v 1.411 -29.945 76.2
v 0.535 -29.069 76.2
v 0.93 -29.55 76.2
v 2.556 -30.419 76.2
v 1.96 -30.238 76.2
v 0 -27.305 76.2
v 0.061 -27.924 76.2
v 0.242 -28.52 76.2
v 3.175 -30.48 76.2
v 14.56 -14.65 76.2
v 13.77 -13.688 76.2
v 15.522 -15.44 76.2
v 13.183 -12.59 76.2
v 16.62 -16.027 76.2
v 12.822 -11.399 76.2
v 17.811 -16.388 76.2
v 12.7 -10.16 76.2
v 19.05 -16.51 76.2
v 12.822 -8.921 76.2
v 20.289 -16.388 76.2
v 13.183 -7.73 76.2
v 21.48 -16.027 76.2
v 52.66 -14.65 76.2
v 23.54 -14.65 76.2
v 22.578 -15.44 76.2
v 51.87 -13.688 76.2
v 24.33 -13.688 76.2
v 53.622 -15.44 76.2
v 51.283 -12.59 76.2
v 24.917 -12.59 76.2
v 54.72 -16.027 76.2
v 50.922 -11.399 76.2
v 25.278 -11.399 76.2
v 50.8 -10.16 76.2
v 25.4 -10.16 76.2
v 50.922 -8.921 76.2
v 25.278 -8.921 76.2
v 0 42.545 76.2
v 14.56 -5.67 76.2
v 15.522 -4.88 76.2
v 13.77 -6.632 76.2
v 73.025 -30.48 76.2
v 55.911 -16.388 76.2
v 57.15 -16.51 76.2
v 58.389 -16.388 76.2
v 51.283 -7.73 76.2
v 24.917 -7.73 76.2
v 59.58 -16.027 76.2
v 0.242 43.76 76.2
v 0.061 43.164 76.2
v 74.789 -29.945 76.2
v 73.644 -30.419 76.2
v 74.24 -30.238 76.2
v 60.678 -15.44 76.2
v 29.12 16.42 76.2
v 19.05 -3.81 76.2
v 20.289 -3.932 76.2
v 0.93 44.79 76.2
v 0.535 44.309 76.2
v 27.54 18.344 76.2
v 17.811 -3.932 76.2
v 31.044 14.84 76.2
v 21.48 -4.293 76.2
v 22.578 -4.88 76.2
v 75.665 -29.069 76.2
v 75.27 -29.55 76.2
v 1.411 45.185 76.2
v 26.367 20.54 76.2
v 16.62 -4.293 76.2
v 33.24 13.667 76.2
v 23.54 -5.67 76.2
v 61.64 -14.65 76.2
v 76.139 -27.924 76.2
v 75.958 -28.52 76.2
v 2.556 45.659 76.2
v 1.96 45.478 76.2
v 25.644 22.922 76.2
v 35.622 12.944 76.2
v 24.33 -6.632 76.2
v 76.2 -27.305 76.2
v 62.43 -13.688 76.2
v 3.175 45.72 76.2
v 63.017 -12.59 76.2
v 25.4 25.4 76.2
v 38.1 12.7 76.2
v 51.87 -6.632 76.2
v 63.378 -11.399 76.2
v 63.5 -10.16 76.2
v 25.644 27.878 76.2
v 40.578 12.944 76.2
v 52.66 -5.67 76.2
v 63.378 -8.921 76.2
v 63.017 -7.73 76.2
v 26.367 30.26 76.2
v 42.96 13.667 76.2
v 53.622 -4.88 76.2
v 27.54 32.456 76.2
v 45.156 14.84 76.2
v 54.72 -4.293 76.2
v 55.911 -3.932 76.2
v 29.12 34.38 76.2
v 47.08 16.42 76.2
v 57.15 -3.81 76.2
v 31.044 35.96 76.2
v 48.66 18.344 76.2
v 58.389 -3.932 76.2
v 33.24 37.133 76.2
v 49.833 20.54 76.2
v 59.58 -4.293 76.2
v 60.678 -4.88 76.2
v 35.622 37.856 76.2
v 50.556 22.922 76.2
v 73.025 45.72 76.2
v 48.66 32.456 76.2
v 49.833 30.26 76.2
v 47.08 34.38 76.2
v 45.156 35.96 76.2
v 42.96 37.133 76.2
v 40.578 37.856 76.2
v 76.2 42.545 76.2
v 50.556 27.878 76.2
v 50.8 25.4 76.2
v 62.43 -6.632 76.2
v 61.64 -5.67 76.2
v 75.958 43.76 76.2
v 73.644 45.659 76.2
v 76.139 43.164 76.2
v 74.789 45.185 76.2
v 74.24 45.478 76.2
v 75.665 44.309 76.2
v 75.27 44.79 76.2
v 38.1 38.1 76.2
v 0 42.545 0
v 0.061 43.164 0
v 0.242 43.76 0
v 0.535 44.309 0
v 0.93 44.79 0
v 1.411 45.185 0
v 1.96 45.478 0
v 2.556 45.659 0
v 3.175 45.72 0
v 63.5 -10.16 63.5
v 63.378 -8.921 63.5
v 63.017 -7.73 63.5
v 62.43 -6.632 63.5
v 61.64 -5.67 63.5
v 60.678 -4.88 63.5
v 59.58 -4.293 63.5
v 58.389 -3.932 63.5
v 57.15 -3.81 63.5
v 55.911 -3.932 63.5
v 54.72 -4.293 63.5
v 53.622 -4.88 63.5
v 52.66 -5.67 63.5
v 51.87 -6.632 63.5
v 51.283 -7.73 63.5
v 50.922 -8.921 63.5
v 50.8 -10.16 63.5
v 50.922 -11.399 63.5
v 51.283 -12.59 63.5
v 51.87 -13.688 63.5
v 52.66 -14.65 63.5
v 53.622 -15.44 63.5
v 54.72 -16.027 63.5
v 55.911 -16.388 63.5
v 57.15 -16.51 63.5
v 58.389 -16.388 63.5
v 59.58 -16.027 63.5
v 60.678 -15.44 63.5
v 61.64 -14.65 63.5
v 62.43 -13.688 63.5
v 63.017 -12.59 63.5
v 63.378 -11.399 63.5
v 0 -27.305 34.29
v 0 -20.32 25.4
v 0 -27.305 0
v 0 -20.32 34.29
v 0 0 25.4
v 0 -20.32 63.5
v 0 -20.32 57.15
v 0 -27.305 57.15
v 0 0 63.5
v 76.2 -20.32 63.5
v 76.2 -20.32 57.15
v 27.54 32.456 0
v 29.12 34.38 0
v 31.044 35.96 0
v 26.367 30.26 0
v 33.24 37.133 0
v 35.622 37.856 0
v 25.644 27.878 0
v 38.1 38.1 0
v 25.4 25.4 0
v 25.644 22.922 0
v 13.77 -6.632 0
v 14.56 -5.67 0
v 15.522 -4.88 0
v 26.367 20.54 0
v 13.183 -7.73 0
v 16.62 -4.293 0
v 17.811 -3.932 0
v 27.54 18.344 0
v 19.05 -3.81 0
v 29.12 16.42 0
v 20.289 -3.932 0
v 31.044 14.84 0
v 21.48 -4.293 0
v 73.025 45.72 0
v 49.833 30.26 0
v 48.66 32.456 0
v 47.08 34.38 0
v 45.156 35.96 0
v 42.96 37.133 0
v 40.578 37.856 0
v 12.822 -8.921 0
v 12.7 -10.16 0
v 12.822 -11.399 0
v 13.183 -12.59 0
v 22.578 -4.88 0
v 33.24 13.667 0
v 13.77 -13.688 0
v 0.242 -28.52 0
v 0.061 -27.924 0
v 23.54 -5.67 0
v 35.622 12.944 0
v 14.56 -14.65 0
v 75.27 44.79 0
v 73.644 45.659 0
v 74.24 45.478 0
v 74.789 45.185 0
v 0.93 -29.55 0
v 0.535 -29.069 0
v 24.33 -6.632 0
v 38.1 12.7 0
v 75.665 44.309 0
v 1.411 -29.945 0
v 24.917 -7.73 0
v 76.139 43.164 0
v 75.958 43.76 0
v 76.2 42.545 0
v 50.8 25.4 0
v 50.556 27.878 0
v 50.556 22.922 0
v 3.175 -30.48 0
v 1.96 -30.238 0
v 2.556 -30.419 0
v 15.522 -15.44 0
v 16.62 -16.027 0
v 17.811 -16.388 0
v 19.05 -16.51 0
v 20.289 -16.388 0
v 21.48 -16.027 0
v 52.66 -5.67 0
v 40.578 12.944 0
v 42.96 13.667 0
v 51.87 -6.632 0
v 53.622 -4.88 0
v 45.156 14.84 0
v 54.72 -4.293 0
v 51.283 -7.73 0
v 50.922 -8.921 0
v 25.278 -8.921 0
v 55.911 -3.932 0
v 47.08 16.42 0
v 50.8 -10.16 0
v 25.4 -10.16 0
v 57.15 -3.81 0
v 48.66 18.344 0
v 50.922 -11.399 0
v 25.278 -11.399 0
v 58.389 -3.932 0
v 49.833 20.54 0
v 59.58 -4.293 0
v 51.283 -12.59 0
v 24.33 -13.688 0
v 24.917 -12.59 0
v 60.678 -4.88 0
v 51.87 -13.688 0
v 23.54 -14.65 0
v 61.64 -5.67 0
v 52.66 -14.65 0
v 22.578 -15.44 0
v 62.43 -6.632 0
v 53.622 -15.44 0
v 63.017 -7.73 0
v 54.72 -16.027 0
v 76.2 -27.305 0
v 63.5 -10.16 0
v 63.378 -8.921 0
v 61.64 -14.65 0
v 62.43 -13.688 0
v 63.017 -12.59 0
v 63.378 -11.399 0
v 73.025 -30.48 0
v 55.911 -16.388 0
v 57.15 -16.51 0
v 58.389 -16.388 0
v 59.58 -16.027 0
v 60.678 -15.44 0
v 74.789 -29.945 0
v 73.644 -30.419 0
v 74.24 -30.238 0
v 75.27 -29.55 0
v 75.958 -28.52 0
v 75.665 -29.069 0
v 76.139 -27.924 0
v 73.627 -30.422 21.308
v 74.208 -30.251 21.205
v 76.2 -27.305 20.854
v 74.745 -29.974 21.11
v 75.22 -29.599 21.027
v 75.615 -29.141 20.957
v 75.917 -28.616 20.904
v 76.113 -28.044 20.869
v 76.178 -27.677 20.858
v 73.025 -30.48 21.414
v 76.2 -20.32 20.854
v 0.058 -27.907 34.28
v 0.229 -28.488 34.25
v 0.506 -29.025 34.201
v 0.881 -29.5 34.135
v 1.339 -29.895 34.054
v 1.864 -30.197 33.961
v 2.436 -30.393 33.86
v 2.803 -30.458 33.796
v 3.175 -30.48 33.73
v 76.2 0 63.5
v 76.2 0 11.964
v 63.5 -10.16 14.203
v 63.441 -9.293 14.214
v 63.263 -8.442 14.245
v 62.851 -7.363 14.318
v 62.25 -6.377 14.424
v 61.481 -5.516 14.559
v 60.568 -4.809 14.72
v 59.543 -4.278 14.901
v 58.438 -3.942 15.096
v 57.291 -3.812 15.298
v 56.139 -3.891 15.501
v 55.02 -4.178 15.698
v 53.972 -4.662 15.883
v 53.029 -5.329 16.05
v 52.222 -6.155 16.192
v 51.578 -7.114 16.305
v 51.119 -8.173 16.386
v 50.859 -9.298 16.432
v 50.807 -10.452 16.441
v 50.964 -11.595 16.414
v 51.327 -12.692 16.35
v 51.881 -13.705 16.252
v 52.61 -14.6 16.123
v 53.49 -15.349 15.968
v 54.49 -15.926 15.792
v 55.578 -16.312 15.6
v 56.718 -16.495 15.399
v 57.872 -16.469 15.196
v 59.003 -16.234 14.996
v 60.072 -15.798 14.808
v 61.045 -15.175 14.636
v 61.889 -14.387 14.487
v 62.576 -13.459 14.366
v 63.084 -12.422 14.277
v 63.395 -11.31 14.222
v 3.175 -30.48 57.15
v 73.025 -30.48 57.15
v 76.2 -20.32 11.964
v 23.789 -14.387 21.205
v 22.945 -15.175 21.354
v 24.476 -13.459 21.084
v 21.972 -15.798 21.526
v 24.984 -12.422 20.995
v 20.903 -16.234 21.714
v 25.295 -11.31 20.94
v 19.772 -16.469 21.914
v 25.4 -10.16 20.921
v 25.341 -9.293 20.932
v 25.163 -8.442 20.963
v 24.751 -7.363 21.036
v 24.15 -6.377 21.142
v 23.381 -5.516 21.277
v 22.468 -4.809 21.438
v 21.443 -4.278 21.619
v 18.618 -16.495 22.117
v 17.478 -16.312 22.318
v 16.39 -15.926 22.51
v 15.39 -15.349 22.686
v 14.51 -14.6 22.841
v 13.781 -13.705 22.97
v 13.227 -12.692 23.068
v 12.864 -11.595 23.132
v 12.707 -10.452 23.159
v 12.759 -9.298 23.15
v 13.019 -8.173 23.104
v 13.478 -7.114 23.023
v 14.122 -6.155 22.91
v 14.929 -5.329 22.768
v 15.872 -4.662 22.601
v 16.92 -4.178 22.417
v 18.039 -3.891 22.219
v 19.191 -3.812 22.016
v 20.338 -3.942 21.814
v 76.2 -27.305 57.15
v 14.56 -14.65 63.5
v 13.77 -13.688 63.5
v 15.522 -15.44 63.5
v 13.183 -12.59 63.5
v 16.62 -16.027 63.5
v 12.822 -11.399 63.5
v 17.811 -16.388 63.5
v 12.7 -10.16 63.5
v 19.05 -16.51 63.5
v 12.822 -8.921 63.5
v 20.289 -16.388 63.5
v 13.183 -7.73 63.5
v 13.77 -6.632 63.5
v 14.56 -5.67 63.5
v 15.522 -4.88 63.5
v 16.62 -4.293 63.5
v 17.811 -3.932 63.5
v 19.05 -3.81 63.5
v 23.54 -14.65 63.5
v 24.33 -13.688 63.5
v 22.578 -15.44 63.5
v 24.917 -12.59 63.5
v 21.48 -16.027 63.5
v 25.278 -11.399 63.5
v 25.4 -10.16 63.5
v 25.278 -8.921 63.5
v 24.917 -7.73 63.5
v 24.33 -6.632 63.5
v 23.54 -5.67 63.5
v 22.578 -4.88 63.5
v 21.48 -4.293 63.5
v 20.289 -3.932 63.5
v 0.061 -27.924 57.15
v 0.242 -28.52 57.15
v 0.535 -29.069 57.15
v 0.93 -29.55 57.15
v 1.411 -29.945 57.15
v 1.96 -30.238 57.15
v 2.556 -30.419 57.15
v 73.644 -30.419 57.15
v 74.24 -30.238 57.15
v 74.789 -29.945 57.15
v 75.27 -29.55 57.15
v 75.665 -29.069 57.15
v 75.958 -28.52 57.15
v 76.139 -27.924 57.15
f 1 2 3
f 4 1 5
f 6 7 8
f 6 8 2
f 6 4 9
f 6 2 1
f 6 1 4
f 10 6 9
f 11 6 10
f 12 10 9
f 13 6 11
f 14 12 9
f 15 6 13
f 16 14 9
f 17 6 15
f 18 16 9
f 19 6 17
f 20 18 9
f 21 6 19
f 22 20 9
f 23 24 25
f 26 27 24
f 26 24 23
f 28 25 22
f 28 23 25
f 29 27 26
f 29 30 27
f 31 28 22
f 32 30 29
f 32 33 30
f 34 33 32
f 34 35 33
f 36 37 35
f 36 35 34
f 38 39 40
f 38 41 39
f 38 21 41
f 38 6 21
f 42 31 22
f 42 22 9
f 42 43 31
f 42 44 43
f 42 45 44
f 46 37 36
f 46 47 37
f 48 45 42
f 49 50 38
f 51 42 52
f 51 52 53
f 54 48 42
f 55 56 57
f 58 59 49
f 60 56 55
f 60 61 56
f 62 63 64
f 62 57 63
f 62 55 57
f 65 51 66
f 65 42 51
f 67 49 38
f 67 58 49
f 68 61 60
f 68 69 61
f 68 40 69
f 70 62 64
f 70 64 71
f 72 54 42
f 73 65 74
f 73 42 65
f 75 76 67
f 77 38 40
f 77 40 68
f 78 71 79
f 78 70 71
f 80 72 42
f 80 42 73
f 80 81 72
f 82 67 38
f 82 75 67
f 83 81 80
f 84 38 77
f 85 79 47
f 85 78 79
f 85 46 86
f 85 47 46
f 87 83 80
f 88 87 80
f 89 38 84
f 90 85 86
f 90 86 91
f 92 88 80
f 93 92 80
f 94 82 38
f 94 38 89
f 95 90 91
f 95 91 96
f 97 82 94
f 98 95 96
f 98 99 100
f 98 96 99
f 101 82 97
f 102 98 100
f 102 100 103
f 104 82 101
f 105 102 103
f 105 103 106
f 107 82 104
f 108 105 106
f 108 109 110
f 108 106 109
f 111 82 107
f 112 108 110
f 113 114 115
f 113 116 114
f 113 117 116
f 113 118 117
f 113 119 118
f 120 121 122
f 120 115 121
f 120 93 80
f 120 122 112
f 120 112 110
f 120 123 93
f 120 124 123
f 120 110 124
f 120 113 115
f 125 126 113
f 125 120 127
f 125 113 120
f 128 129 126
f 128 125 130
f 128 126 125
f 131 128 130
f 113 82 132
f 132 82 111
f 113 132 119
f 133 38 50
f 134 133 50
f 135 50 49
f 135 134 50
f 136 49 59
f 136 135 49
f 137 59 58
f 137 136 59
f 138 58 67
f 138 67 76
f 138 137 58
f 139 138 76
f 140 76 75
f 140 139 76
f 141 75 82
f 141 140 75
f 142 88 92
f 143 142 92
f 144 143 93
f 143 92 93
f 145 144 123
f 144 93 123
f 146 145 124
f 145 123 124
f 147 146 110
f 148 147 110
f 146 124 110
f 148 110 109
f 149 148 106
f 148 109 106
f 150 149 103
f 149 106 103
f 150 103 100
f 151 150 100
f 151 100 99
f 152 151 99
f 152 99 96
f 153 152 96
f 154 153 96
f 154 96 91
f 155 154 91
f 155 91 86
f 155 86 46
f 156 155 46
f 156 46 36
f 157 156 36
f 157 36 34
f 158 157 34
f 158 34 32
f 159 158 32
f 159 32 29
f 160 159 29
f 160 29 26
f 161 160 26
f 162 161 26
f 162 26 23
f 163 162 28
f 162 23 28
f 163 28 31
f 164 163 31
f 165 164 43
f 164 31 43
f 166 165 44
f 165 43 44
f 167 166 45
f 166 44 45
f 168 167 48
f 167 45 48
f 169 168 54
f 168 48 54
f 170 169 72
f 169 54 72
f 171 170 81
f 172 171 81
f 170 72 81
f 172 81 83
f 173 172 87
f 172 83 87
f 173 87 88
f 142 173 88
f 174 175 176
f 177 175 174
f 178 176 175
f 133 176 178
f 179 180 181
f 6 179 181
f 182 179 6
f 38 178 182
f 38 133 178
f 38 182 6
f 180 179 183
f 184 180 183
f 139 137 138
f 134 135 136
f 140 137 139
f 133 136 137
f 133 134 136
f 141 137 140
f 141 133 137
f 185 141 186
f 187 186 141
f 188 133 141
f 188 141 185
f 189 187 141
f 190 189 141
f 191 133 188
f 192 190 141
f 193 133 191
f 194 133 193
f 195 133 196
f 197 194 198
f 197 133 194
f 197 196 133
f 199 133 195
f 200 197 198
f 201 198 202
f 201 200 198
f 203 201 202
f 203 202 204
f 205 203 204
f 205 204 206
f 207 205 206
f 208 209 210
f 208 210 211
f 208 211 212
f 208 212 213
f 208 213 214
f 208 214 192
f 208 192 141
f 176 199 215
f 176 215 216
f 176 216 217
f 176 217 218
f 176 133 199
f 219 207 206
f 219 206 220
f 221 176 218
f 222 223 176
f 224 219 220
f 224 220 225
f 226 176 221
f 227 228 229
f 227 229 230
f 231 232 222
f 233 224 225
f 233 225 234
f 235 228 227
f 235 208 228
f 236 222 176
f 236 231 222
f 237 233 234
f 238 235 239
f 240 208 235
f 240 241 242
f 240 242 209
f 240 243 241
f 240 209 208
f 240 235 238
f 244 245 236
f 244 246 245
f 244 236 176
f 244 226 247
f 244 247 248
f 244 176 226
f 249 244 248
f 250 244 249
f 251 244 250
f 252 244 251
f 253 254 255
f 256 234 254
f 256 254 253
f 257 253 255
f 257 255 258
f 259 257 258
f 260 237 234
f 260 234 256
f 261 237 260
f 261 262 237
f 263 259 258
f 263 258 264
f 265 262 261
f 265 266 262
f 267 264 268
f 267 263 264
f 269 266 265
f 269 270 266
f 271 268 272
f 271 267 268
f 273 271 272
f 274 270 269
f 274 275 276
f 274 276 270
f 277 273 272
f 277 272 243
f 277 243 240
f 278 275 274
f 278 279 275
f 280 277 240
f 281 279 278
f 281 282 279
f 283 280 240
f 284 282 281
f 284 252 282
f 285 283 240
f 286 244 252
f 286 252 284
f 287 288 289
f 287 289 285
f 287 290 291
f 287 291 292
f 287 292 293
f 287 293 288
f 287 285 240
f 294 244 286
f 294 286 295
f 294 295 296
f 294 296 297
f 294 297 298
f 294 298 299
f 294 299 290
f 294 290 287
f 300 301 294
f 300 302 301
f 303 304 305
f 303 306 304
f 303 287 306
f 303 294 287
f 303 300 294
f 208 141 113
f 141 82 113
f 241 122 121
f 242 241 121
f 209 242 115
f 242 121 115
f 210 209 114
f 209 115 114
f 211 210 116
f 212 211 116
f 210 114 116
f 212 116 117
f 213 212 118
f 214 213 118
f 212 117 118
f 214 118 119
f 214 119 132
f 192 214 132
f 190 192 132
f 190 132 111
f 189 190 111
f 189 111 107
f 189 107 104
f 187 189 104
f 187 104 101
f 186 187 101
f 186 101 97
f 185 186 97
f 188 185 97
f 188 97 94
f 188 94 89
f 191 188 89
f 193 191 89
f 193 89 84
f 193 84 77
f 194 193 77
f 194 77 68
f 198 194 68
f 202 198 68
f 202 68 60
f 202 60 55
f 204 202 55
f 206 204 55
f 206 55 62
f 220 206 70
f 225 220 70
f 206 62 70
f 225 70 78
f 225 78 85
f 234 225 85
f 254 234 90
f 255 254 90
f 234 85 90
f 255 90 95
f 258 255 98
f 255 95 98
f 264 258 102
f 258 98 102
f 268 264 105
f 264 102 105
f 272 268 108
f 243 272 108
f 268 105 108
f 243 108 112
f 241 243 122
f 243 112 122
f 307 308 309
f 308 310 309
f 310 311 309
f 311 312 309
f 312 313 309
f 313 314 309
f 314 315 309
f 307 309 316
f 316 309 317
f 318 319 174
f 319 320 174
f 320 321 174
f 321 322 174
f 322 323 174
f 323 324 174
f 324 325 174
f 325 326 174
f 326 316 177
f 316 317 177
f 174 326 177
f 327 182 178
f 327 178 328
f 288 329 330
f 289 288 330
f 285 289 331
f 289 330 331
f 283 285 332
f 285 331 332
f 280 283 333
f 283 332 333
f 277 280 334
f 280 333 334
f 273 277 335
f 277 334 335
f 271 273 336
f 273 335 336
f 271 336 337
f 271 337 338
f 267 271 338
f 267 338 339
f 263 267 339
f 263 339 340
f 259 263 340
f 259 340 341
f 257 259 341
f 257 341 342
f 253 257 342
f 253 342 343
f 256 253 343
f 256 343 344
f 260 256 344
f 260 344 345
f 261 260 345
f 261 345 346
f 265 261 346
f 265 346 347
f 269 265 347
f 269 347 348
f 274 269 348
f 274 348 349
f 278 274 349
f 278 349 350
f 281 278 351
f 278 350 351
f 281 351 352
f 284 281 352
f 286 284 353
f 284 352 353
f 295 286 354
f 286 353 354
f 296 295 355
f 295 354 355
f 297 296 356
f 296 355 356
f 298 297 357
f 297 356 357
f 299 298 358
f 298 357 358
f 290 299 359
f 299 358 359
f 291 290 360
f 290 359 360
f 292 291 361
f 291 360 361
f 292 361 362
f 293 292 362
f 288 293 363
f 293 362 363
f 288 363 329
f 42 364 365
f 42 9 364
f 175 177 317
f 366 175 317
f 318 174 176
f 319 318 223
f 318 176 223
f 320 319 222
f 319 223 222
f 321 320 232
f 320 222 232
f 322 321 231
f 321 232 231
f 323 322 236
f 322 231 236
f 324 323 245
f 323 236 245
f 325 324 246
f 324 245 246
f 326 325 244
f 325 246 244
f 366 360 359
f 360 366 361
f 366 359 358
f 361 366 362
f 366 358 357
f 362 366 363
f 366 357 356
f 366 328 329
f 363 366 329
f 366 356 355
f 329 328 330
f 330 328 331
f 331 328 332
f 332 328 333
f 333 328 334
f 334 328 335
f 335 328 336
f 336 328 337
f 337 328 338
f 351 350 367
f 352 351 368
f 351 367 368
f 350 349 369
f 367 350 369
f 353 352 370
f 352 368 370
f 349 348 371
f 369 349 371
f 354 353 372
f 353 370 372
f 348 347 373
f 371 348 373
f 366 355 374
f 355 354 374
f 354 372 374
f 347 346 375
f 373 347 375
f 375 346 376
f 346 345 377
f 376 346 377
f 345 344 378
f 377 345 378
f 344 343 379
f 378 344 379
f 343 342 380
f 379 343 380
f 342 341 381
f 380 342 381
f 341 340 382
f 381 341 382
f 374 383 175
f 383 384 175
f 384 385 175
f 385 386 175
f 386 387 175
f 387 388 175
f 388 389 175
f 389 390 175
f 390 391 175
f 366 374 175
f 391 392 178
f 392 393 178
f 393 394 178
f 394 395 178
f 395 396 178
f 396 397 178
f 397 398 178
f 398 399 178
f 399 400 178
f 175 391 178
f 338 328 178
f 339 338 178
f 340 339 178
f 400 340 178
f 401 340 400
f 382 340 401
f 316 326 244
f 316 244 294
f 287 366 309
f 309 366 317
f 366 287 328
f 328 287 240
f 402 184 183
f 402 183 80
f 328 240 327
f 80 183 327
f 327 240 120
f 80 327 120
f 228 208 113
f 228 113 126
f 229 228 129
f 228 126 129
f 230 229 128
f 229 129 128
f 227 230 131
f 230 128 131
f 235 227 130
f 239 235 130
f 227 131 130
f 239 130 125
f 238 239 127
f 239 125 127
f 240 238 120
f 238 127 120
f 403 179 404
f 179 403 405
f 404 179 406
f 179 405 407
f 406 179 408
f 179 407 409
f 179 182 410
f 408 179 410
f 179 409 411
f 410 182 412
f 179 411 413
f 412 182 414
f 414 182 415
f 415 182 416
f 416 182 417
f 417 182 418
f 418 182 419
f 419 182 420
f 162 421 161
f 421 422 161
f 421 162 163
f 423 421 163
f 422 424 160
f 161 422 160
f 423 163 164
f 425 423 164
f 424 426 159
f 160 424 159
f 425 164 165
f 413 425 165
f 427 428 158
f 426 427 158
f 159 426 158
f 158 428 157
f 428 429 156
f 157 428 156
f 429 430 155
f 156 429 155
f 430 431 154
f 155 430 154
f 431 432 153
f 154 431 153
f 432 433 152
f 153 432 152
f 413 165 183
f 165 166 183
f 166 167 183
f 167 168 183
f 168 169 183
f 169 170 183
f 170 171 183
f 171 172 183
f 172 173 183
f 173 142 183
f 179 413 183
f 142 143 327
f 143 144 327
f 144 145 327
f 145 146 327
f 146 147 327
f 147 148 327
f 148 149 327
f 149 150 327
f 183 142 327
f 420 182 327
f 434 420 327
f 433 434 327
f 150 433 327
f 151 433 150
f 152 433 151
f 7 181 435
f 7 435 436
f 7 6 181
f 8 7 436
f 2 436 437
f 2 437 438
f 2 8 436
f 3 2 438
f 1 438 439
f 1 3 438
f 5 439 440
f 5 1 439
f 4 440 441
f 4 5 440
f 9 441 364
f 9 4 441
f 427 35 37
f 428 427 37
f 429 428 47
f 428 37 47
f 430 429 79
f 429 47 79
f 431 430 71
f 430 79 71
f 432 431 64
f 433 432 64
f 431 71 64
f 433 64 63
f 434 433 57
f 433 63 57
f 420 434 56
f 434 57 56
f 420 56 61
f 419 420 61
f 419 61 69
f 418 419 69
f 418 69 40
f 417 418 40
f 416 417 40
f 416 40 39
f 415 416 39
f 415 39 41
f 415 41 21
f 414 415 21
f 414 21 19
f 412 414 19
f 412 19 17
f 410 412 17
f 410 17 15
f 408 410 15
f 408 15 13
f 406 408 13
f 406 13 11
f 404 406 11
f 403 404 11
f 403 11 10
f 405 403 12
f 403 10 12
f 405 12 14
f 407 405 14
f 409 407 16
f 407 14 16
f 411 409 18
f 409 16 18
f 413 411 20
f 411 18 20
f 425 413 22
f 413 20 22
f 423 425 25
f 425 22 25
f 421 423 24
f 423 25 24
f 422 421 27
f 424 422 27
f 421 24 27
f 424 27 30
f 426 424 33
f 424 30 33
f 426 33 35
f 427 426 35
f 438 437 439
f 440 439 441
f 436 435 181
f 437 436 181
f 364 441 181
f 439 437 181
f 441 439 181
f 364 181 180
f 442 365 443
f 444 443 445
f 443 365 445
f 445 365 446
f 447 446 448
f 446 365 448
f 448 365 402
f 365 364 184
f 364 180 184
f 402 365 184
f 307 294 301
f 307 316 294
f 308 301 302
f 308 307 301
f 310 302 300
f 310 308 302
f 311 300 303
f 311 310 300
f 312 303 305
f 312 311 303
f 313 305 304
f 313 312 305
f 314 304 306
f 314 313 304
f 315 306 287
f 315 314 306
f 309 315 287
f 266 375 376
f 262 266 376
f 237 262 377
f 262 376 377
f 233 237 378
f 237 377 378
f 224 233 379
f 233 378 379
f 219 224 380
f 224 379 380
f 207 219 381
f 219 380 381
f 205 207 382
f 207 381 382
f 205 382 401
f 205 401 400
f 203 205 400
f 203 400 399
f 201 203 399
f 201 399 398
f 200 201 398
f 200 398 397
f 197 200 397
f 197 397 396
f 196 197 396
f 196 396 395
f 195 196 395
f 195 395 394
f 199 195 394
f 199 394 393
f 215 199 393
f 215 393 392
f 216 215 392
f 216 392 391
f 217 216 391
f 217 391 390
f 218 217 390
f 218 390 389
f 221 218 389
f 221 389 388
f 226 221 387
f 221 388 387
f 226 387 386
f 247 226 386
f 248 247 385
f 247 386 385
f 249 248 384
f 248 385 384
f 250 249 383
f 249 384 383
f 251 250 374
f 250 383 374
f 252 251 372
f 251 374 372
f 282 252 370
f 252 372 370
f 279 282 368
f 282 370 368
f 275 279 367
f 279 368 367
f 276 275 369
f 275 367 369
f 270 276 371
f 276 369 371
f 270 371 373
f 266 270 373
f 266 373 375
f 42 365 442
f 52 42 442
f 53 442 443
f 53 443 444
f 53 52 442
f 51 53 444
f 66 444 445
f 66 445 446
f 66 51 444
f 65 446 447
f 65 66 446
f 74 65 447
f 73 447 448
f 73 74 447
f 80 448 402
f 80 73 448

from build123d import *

# Parameters (mm, degrees)
F0_W     = 76.2
F0_H     = 12.7
F0_H_2   = 6.35
F1_DEPTH = 45.72
F2_DEPTH = 20.32
F3_W     = 76.2
F3_H     = 19.05
F4_DEPTH = 10.16
F5_R     = 6.35
F5_R_2   = 12.7
F6_DEPTH = 76.201
F7_R     = 3.175


with BuildPart() as f1:
    # F0 (on Front) → F1 (new body)
    with BuildSketch(Plane.XZ):
        with Locations((38.1, 69.85)):
            Rectangle(F0_W, F0_H)
        with Locations((38.1, 60.325)):
            Rectangle(F0_W, F0_H_2)
        Polygon((0, 57.15), (0, 34.29), (76.2, 20.853884), (76.2, 57.15), align=None)
        Polygon((0, 34.29), (0, 25.4), (76.2, 11.963884), (76.2, 20.853884), align=None)
        Polygon((0, 25.4), (0, 0), (76.2, 0), (76.2, 11.963884), align=None)
    extrude(amount=-F1_DEPTH)

    # F0 (on Front) → F2 (join)
    with BuildSketch(Plane.XZ):
        with Locations((38.1, 69.85)):
            Rectangle(F0_W, F0_H)
        Polygon((0, 25.4), (0, 0), (76.2, 0), (76.2, 11.963884), align=None)
    extrude(amount=F2_DEPTH)

    # F3 (on face) → F4 (join)
    with BuildSketch(Plane.XZ.offset(20.32)):
        with Locations((38.1, 66.675)):
            Rectangle(F3_W, F3_H)
        Polygon((76.2, 20.853884), (0, 34.29), (0, 0), (76.2, 0), align=None)
    extrude(amount=F4_DEPTH)

    # F5 (on face) → F6 (cut, through all)
    with BuildSketch(Plane.XY.offset(76.2)):
        with Locations((19.05, -10.16)):
            Circle(F5_R)
        with Locations((57.15, -10.16)):
            Circle(F5_R)
        with Locations((38.1, 25.4)):
            Circle(F5_R_2)
    extrude(amount=-F6_DEPTH, mode=Mode.SUBTRACT)

    # F7
    f7_edges = [f1.edges().sort_by_distance(p)[0] for p in [
        (76.2, -30.48, 10.426942),
        (0, -30.48, 17.145),
        (76.2, 45.72, 38.1),
        (0, 45.72, 38.1),
        (76.2, -30.48, 66.675),
        (0, -30.48, 66.675),
    ]]
    fillet(f7_edges, radius=F7_R)


solid = f1.part
